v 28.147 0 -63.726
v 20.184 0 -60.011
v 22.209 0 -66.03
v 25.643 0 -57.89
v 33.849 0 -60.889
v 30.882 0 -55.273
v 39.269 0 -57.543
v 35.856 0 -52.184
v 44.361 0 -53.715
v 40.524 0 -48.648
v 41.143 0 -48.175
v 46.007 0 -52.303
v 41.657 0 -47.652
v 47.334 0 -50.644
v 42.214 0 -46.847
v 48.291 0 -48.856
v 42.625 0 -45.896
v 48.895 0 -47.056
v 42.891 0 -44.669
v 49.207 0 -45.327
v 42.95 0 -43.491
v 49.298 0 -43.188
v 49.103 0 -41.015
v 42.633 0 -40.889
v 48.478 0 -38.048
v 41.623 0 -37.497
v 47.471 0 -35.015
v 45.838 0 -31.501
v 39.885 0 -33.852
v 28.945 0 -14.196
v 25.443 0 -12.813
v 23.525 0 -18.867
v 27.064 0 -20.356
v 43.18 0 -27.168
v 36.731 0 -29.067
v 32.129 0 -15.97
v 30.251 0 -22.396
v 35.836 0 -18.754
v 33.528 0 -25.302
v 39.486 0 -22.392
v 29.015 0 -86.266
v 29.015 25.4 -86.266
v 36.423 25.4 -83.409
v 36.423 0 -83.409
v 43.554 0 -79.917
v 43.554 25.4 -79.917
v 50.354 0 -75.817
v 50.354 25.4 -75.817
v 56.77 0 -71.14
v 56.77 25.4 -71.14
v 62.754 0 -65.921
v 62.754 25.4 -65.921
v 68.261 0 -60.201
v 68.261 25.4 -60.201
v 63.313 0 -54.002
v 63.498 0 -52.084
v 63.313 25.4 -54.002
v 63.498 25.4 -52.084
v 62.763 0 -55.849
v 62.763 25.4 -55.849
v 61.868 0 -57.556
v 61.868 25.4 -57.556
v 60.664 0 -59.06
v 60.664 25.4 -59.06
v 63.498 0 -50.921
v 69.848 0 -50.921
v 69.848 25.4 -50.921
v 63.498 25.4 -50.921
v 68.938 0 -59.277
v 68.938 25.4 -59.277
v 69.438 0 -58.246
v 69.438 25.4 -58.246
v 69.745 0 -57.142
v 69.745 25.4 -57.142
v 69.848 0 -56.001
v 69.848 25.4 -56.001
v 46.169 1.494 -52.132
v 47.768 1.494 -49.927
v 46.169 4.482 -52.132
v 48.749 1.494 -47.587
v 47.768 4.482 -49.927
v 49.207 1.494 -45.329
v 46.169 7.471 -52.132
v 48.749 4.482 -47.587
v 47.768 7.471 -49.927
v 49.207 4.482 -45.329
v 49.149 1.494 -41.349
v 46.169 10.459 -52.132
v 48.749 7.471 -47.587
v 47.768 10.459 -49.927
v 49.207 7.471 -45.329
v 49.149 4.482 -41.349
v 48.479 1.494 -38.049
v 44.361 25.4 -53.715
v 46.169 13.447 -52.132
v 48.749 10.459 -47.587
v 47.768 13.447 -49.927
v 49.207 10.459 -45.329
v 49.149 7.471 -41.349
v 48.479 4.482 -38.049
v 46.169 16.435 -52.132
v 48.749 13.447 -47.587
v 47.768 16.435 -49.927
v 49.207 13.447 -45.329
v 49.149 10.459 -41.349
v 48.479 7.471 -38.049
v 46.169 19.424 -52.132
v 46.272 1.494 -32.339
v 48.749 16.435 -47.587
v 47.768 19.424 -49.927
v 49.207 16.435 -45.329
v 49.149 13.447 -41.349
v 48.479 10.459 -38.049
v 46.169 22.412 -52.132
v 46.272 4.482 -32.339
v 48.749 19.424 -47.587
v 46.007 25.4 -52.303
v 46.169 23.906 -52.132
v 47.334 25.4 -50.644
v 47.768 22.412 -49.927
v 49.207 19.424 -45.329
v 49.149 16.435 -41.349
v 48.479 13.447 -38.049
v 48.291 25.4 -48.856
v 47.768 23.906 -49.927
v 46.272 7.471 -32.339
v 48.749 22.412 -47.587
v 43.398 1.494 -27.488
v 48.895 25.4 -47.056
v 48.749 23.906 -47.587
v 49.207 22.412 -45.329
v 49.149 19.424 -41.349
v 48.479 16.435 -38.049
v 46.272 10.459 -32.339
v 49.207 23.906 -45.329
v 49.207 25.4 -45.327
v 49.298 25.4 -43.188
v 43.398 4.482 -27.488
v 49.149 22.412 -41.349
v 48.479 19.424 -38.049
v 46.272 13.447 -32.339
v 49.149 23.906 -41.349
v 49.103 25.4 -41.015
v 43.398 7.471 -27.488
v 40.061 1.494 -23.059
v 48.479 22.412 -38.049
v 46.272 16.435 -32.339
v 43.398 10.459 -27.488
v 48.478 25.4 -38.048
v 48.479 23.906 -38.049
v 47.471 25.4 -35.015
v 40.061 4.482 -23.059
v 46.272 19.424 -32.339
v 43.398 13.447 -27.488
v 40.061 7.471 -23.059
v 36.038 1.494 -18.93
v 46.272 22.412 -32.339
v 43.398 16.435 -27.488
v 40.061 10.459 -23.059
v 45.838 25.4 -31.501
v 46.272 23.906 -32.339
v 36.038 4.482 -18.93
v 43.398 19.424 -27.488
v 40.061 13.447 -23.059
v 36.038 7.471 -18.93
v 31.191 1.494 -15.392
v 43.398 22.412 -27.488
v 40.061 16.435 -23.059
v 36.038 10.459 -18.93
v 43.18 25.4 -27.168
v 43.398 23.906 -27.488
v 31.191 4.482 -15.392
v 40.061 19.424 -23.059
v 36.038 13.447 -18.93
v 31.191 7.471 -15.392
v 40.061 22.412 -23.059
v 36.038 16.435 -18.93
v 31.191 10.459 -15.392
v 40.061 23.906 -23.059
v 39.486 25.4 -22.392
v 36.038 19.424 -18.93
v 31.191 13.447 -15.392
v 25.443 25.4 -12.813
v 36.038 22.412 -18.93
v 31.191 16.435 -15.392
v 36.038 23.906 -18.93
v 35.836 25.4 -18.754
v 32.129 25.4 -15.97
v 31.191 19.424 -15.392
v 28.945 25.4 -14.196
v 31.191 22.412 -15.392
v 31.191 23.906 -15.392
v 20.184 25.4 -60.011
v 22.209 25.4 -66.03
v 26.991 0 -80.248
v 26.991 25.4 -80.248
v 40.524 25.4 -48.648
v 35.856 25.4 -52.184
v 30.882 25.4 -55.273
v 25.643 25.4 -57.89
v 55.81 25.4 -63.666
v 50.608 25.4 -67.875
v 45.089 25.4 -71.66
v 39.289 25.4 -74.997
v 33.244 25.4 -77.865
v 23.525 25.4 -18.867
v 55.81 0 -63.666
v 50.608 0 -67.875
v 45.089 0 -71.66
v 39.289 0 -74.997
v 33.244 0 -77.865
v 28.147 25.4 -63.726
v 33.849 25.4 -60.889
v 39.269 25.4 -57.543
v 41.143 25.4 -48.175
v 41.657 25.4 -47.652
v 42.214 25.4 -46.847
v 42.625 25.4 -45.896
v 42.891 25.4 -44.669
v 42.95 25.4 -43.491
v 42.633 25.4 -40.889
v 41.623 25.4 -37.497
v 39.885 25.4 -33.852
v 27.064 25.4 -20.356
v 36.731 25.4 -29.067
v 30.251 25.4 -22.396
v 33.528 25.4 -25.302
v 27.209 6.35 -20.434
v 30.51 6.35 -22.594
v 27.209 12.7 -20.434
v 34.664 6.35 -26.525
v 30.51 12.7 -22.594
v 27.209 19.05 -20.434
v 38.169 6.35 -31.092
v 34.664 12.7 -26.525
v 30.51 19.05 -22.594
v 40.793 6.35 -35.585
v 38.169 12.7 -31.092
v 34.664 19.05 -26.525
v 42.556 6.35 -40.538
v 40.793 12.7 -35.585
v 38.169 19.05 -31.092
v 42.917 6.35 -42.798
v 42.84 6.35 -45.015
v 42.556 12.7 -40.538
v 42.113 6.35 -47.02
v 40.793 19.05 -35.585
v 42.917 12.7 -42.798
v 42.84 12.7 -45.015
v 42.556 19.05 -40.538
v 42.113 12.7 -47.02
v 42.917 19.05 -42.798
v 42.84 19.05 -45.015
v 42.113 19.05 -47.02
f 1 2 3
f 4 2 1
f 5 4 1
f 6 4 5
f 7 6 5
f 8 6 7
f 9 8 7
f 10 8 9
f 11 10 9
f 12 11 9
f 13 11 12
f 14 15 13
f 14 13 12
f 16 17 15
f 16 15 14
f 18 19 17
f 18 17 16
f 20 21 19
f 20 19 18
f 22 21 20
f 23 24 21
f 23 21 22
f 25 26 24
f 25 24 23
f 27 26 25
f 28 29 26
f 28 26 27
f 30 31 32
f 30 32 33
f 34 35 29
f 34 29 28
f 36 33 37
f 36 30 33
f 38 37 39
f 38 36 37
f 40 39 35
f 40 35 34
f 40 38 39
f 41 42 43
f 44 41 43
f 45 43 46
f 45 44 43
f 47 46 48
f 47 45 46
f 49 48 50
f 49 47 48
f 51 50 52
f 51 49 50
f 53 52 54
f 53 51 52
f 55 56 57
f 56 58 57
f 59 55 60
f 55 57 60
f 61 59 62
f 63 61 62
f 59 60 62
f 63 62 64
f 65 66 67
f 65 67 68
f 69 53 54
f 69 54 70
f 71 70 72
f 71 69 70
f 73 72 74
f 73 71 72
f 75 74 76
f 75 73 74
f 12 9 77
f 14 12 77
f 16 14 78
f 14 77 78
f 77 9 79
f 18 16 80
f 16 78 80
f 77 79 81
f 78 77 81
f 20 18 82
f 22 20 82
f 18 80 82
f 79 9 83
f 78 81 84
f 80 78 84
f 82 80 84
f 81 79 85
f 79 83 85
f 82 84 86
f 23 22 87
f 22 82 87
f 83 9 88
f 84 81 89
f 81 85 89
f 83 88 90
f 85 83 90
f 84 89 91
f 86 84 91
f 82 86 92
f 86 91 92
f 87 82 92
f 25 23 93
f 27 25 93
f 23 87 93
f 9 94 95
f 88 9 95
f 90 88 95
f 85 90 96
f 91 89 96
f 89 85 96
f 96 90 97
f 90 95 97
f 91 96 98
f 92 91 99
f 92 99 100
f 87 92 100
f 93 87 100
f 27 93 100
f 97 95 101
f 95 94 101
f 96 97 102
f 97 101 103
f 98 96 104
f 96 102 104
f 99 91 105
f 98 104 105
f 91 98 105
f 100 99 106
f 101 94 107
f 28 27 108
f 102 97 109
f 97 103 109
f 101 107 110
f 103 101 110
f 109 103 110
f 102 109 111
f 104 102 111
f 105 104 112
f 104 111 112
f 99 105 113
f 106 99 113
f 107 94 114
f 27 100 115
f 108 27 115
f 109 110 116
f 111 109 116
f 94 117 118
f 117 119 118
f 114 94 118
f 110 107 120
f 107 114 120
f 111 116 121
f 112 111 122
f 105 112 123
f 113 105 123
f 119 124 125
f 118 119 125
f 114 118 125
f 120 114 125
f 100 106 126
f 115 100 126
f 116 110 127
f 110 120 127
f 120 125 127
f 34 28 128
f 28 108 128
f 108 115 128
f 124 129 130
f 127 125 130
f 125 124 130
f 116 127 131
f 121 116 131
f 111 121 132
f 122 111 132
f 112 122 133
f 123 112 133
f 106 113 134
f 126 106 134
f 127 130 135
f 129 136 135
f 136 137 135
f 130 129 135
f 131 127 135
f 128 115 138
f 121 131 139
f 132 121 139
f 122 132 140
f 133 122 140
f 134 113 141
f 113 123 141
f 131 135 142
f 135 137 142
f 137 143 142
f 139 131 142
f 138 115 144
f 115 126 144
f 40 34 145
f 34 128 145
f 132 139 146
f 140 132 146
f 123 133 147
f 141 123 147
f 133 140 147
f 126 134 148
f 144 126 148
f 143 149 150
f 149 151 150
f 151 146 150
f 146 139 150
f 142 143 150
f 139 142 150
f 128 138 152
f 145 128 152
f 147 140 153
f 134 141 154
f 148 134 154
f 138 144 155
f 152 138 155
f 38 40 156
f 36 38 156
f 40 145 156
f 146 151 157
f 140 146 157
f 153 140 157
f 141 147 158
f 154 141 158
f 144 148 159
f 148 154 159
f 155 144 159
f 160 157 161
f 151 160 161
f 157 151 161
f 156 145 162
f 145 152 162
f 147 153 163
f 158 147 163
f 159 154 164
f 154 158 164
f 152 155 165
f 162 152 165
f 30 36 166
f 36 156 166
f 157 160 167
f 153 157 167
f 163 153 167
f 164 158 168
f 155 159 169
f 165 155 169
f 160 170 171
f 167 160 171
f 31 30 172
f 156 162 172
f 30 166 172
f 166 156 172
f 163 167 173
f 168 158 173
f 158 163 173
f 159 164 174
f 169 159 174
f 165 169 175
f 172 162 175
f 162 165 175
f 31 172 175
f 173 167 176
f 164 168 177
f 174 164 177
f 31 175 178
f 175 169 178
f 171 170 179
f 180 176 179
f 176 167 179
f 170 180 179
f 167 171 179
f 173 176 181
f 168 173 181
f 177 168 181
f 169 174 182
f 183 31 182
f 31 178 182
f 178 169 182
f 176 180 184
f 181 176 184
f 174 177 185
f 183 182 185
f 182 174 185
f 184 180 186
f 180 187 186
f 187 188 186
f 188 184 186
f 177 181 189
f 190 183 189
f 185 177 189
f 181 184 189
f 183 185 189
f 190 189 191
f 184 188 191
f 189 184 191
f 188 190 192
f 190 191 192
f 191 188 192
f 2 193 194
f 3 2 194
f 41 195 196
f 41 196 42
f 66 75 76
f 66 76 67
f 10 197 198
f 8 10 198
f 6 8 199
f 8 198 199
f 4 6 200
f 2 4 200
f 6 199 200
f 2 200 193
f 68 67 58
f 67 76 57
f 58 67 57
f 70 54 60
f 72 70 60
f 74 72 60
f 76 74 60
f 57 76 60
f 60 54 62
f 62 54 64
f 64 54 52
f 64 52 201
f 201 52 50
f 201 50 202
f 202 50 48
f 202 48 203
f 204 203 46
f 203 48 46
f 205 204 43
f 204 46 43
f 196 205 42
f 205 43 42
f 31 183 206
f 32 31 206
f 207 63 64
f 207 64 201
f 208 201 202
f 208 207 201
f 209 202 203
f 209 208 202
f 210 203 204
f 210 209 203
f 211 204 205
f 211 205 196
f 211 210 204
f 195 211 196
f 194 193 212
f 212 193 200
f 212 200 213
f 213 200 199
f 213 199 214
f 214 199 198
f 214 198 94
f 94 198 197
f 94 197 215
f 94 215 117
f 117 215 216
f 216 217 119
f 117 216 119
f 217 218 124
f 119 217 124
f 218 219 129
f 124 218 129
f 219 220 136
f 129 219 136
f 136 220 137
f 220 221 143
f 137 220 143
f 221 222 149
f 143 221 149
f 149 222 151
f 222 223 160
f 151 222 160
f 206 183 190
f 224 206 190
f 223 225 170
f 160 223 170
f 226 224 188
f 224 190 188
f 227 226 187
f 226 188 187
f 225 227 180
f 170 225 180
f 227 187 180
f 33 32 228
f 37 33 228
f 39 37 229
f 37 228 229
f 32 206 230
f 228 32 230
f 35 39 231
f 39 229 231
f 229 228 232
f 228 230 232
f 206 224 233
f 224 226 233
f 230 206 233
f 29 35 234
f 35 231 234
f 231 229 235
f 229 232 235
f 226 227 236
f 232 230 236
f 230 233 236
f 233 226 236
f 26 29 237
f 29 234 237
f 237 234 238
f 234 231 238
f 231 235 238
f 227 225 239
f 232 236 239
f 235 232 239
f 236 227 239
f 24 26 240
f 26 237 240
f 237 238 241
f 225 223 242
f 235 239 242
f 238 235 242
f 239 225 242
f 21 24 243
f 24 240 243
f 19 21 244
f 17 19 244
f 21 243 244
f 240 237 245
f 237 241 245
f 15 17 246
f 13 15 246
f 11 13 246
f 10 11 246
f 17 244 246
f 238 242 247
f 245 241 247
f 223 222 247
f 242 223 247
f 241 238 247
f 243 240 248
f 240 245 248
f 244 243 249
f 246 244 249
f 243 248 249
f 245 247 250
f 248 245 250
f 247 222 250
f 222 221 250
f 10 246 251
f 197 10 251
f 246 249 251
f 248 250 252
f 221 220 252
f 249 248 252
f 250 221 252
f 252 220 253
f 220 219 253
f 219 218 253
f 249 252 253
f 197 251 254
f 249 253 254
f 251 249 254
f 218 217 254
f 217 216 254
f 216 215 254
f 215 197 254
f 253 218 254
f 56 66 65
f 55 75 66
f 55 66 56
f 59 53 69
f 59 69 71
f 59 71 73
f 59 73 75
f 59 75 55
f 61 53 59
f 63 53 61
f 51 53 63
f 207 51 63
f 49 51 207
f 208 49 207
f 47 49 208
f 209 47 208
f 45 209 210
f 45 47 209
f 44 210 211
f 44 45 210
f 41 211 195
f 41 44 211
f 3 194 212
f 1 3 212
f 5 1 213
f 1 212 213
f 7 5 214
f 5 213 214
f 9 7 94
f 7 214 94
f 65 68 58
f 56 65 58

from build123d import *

# Parameters (mm, degrees)
BOSS_EXTRUDE1_DEPTH = 25.4
FILLET1_R           = 10
BOSS_EXTRUDE4_START = -25.4
BOSS_EXTRUDE4_DEPTH = 25.4


# Read off the part's stored shape, not the designer's step: Boss-Extrude4
with BuildPart() as part:
    # Sketch2 → Boss-Extrude1 (new body)
    with BuildSketch(Plane(origin=(0, 0, 0), x_dir=(1, 0, 0), z_dir=(0, 1, 0))):
        with BuildLine():
            Line((26.990684498, 80.247524419), (29.015025684, 86.266207228))
            ThreePointArc((29.015025684, 86.266207228), (50.353700038, 75.817116257), (68.260852948, 60.201214106))
            ThreePointArc((68.260852948, 60.201214106), (69.438254348, 58.246136107), (69.84838065, 56.001052489))
            Line((69.84838065, 56.001052489), (69.84838065, 50.921052489))
            Line((69.84838065, 50.921052489), (63.49838065, 50.921052489))
            Line((63.49838065, 50.921052489), (63.49838065, 56.001052489))
            ThreePointArc((63.49838065, 56.001052489), (46.840586867, 70.527453144), (26.990684498, 80.247524419))
        make_face()
    extrude(amount=BOSS_EXTRUDE1_DEPTH)

    # Fillet1
    fillet1_edges = [part.edges().sort_by_distance(p)[0] for p in [
        (63.49838065, 12.7, -56.001052489),
    ]]
    fillet(fillet1_edges, radius=FILLET1_R)


with BuildPart() as body_2:
    # Boss-Extrude4 outline → Boss-Extrude4 (new body)
    with BuildSketch(Plane.XZ.offset(BOSS_EXTRUDE4_START)):
        with BuildLine():
            Line((25.443194989, -12.813304883), (23.525014075, -18.866657837))
            add(Edge.make_bspline(
                [(23.525014075, -18.866657837), (26.114575337, -19.687235626), (31.775394583, -22.853586916), (38.317852456, -30.637589066), (43.142544067, -39.612852868), (43.312489198, -46.804499087), (40.524158317, -48.647526327)],
                knots=[0, 0, 0, 0, 0.205148784, 0.501586038, 0.771461063, 1, 1, 1, 1], degree=3))
            ThreePointArc((40.524158317, -48.647526327), (30.881518582, -55.273149314), (20.184434996, -60.011480642))
            Line((20.184434996, -60.011480642), (22.208776183, -66.030163452))
            ThreePointArc((22.208776183, -66.030163452), (33.849439104, -60.888649988), (44.360626436, -53.715426529))
            add(Edge.make_bspline(
                [(44.360626436, -53.715426529), (45.015216296, -53.250169824), (46.343641563, -52.092024645), (47.875354125, -49.947427349), (48.838279291, -47.569566152), (49.40857056, -44.540276682), (49.270972893, -41.891353114), (48.869817551, -39.602052244), (48.36616574, -37.521826688), (47.535128231, -35.035489663), (46.300392638, -32.303771245), (44.89812363, -29.783016532), (43.413252329, -27.47460777), (41.834458355, -25.246492838), (39.507630167, -22.312259754), (36.178518616, -18.835694792), (32.146020616, -15.831975993), (28.473476707, -13.910036954), (26.459130099, -13.13523271), (25.443194989, -12.813304883)],
                knots=[0.004512861, 0.004512861, 0.004512861, 0.004512861, 0.03125, 0.0625, 0.09375, 0.125, 0.1875, 0.21875, 0.25, 0.3125, 0.375, 0.4375, 0.5, 0.5625, 0.625, 0.75, 0.875, 0.9375, 1, 1, 1, 1], degree=3))
        make_face()
    extrude(amount=BOSS_EXTRUDE4_DEPTH)


solid = Compound([part.part, body_2.part])
